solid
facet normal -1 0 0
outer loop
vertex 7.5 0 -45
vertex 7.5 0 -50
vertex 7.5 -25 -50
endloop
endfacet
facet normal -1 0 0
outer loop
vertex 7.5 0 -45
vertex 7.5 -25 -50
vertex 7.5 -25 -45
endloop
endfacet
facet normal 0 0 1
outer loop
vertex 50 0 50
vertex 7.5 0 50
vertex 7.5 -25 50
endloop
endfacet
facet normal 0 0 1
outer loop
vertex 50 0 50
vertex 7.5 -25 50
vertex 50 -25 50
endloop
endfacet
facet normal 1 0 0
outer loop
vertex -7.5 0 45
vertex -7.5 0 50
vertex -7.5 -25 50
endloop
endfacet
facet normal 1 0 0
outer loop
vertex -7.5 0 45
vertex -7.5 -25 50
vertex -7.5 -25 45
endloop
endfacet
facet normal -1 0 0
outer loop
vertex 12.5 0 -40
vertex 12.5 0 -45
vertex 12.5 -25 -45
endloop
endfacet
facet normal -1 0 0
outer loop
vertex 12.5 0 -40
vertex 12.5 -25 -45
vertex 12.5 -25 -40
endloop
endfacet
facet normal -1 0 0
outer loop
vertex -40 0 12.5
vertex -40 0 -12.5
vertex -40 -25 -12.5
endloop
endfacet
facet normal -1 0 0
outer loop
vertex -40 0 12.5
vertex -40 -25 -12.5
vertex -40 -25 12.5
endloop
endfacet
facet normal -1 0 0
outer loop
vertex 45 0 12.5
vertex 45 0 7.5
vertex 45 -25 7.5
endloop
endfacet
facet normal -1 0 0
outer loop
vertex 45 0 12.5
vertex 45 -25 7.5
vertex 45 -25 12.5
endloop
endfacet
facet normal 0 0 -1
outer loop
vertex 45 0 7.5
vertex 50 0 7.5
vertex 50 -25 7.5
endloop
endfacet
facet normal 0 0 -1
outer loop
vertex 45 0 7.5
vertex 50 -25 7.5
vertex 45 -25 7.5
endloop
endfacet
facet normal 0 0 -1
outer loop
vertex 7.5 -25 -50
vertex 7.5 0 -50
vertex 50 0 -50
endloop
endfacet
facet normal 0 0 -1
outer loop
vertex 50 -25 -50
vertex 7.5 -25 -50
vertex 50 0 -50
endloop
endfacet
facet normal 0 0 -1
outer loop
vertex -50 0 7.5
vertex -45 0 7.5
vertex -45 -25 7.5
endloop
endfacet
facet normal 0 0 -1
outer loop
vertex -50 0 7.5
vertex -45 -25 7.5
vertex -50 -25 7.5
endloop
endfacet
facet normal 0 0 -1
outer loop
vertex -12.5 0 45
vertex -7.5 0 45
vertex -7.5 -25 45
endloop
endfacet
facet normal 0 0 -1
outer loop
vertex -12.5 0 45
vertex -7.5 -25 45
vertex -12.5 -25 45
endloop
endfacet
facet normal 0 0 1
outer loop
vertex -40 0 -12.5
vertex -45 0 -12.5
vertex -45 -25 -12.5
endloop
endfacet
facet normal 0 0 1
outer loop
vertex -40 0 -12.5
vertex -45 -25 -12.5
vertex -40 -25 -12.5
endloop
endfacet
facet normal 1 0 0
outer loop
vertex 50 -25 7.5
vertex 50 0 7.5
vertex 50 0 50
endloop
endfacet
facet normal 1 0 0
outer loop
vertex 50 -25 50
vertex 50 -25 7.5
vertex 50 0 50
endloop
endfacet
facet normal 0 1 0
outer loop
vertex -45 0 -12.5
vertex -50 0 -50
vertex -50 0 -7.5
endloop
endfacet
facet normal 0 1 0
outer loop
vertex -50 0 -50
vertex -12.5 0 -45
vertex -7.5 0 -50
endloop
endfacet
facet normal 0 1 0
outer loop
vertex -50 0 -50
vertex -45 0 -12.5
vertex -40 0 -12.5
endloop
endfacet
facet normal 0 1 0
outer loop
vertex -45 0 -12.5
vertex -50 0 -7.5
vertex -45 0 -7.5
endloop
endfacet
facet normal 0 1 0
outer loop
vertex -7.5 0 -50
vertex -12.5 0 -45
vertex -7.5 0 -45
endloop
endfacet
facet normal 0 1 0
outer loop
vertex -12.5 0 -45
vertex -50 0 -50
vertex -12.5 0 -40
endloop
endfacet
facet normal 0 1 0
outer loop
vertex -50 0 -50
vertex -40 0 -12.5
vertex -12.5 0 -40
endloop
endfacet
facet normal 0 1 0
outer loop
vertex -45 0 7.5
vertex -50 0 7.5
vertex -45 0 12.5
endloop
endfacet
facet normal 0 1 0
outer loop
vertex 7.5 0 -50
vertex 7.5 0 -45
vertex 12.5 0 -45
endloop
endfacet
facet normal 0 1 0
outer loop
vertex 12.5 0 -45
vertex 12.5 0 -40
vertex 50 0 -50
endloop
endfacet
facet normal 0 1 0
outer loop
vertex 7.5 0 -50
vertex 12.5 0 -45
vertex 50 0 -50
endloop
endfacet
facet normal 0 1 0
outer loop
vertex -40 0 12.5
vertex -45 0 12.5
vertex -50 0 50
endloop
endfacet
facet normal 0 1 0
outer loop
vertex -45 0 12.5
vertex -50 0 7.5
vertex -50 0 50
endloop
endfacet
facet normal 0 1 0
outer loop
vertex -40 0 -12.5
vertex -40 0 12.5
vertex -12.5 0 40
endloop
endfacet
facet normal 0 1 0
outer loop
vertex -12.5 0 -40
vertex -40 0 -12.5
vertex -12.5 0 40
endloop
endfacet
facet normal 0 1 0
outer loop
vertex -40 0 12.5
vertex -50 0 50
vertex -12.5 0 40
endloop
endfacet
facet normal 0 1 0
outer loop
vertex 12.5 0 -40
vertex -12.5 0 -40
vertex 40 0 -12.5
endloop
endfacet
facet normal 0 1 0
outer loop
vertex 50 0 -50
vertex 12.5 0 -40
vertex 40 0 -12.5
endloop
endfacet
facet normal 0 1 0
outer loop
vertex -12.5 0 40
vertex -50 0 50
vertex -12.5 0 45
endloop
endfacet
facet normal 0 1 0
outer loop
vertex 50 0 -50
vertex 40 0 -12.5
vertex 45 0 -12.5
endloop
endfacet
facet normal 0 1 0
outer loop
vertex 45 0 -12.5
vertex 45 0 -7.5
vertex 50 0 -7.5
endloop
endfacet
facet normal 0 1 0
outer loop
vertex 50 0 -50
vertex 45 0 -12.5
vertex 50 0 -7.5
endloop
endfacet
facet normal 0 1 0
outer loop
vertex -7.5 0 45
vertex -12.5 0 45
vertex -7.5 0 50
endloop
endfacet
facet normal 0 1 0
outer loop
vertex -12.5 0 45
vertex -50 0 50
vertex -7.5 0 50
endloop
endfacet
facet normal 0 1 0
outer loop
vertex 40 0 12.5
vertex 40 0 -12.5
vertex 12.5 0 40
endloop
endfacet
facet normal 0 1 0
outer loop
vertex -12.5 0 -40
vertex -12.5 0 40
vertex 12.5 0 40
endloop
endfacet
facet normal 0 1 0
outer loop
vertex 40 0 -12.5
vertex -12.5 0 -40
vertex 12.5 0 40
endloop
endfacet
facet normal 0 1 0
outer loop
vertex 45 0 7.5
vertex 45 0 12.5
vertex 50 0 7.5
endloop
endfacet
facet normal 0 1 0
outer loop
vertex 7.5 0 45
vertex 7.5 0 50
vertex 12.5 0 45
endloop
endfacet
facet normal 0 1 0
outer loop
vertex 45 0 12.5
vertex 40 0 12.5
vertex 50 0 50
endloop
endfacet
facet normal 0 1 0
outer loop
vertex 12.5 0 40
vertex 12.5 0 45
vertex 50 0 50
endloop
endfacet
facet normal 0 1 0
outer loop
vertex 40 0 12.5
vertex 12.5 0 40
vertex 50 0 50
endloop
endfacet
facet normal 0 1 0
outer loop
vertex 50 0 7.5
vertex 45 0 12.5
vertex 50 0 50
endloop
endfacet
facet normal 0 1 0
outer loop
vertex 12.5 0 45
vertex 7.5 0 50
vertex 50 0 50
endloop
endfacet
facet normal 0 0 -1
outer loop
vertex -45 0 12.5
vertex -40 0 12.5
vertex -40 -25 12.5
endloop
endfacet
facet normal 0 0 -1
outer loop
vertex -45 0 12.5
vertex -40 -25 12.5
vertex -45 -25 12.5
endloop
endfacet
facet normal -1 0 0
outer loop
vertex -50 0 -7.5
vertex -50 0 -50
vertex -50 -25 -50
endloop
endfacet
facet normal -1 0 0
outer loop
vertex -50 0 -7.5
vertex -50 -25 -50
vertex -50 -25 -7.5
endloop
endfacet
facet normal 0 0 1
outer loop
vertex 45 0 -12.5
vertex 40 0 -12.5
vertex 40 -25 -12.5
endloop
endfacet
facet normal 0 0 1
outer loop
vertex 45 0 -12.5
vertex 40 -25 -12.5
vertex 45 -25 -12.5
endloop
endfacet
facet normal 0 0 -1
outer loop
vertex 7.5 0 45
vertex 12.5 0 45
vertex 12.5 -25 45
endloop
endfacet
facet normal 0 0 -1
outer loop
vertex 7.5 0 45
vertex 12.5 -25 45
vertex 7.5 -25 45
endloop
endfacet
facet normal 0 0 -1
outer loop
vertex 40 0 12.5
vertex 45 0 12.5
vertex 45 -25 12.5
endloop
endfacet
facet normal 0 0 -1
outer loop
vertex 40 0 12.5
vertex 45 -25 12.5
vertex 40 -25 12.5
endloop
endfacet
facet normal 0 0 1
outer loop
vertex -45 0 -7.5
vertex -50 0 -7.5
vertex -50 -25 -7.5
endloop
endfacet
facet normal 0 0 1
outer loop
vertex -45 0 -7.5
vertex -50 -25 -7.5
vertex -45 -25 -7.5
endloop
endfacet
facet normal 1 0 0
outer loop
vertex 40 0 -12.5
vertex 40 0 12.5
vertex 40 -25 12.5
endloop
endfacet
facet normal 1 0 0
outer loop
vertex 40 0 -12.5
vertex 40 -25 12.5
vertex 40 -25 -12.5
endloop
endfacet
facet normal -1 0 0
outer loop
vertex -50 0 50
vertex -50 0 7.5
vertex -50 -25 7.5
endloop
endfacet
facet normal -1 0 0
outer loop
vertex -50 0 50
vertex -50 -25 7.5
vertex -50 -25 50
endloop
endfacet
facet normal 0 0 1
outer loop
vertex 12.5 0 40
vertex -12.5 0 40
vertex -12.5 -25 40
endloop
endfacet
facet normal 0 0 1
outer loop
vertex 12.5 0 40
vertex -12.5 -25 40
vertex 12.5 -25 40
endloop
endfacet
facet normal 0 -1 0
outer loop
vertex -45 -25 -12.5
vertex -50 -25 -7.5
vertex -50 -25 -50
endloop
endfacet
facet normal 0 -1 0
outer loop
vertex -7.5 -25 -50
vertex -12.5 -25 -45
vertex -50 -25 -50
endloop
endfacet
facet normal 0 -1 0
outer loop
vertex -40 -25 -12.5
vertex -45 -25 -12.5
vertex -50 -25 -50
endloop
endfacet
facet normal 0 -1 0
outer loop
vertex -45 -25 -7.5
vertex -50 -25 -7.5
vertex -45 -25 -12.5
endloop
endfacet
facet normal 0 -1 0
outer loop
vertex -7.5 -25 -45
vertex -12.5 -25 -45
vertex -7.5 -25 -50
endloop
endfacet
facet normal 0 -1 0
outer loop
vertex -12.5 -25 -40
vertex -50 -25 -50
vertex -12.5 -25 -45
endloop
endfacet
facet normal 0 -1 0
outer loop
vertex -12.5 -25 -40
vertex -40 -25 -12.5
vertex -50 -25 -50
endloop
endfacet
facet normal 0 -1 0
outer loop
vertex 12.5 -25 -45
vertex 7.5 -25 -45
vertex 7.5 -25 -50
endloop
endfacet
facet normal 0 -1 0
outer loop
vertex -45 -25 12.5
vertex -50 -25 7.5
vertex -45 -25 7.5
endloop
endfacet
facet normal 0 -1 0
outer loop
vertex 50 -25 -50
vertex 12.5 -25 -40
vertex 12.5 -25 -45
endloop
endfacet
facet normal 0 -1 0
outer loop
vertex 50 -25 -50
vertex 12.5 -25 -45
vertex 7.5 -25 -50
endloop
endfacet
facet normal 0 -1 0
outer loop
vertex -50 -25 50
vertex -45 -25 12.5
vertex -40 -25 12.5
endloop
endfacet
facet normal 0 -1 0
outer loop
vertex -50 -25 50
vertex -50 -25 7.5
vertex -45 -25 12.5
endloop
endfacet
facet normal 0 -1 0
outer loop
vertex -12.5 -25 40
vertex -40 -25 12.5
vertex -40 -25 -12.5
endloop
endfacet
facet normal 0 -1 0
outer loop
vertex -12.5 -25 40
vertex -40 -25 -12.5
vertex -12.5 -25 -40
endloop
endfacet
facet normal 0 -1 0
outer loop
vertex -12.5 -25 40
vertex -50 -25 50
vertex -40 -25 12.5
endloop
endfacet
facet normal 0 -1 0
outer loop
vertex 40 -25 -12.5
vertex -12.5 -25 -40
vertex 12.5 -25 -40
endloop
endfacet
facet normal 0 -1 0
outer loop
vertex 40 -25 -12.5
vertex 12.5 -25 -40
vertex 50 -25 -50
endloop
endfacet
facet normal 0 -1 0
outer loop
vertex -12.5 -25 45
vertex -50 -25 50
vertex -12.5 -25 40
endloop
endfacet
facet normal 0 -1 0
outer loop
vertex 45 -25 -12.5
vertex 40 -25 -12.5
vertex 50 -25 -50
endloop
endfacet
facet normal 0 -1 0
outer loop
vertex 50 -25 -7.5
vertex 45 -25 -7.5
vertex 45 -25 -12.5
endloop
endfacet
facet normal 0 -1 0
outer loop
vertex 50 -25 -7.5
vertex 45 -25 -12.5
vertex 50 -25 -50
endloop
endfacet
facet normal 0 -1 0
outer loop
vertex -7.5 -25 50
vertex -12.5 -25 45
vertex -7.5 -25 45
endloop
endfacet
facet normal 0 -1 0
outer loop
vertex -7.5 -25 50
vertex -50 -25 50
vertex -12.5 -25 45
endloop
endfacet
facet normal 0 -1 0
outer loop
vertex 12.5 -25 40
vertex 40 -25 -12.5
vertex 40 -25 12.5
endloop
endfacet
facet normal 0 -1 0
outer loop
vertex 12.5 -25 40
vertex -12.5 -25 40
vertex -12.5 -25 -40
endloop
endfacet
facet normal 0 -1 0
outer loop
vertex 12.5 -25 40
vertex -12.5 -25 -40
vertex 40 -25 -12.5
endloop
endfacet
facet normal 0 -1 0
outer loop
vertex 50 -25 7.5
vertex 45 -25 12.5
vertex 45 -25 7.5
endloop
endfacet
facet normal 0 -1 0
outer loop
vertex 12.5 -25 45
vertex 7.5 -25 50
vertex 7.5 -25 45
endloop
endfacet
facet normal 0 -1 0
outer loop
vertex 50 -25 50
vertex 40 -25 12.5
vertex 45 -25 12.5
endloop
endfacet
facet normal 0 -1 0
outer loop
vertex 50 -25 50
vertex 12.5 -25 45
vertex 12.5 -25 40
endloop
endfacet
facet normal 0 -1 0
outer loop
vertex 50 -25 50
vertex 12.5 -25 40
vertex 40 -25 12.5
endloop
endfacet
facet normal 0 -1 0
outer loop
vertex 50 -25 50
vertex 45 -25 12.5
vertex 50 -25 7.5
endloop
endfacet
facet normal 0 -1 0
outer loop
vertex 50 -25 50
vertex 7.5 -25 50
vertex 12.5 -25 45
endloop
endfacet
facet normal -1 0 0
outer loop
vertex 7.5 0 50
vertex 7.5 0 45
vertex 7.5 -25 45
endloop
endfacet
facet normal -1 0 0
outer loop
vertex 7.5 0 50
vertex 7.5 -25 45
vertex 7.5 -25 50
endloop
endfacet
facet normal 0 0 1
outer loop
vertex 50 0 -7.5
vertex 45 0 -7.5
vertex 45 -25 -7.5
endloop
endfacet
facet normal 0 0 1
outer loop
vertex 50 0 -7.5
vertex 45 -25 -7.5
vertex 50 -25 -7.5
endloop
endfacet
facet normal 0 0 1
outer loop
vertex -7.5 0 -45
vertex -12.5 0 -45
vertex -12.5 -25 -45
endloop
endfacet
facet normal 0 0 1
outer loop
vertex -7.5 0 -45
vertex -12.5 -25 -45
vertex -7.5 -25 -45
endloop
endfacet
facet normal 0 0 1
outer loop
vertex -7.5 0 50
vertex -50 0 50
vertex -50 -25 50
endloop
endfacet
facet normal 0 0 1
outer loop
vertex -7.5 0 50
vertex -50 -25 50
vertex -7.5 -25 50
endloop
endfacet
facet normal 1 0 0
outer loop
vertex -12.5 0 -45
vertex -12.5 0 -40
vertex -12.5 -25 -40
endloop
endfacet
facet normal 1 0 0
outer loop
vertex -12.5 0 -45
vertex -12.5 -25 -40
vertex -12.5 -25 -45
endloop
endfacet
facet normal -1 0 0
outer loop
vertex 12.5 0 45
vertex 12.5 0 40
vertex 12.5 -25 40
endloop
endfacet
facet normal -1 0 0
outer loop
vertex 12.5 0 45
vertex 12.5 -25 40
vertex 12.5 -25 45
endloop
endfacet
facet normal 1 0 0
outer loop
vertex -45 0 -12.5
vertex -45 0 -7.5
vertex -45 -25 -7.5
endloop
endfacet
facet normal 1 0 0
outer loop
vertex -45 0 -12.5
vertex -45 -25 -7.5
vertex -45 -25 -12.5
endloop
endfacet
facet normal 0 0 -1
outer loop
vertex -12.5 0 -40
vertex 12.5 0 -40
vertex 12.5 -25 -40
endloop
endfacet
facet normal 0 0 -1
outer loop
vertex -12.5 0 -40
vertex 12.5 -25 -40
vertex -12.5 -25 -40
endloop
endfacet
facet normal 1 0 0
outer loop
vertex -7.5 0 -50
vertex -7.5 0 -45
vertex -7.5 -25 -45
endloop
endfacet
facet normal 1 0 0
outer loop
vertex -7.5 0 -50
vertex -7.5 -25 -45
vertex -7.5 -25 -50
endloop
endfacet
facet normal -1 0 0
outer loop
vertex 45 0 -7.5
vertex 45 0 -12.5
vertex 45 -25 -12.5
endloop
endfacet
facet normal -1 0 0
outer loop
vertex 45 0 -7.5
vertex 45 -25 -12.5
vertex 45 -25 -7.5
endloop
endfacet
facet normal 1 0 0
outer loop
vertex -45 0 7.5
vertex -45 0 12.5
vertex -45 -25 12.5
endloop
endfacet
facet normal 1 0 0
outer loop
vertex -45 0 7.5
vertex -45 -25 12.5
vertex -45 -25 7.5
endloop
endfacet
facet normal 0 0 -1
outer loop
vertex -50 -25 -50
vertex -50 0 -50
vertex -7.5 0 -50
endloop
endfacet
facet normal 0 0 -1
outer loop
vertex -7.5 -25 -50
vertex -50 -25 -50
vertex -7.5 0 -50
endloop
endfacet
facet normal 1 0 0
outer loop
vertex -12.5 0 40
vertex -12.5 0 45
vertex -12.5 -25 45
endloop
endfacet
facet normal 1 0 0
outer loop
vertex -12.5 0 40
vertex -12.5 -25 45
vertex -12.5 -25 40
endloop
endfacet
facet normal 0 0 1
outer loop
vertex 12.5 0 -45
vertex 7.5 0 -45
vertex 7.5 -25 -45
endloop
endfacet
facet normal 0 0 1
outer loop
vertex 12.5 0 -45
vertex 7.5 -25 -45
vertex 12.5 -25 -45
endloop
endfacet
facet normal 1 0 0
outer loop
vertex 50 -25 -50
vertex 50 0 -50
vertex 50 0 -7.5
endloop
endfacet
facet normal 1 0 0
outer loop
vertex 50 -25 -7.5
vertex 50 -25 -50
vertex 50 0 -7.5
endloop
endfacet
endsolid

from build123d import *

# Parameters (mm, degrees)
F0_W            = 100
F0_H            = 100
F2_DEPTH        = 25
F4_DEPTH        = 25.001
F4_COPIES_COUNT = 4


# Not quite as in the source:
# - a pattern or mirror of a feature is missing from the dataset's text; its kind, count and spacing are read off the source's solid


with BuildPart() as f2:
    # F0 (on Front) → F2 (new body)
    with BuildSketch(Plane.XZ):
        Rectangle(F0_W, F0_H)
    extrude(amount=F2_DEPTH)

    # F3 (on Front) → F4 (cut, through all)
    with BuildSketch(Plane.XZ):
        Polygon((7.5, 50), (0, 50), (-7.5, 50), (-7.5, 45), (-12.5, 45), (-12.5, 40), (0, 40), (12.5, 40), (12.5, 45), (7.5, 45), align=None)
    f4 = extrude(amount=F4_DEPTH, mode=Mode.SUBTRACT)

    # F4_copies: F4 ×4 about axis
    f4_copies_axis = Axis((0, 0, 0), (0, 1, 0))
    for i in range(1, F4_COPIES_COUNT):
        add(f4.rotate(f4_copies_axis, i * 360 / F4_COPIES_COUNT), mode=Mode.SUBTRACT)


solid = f2.part
